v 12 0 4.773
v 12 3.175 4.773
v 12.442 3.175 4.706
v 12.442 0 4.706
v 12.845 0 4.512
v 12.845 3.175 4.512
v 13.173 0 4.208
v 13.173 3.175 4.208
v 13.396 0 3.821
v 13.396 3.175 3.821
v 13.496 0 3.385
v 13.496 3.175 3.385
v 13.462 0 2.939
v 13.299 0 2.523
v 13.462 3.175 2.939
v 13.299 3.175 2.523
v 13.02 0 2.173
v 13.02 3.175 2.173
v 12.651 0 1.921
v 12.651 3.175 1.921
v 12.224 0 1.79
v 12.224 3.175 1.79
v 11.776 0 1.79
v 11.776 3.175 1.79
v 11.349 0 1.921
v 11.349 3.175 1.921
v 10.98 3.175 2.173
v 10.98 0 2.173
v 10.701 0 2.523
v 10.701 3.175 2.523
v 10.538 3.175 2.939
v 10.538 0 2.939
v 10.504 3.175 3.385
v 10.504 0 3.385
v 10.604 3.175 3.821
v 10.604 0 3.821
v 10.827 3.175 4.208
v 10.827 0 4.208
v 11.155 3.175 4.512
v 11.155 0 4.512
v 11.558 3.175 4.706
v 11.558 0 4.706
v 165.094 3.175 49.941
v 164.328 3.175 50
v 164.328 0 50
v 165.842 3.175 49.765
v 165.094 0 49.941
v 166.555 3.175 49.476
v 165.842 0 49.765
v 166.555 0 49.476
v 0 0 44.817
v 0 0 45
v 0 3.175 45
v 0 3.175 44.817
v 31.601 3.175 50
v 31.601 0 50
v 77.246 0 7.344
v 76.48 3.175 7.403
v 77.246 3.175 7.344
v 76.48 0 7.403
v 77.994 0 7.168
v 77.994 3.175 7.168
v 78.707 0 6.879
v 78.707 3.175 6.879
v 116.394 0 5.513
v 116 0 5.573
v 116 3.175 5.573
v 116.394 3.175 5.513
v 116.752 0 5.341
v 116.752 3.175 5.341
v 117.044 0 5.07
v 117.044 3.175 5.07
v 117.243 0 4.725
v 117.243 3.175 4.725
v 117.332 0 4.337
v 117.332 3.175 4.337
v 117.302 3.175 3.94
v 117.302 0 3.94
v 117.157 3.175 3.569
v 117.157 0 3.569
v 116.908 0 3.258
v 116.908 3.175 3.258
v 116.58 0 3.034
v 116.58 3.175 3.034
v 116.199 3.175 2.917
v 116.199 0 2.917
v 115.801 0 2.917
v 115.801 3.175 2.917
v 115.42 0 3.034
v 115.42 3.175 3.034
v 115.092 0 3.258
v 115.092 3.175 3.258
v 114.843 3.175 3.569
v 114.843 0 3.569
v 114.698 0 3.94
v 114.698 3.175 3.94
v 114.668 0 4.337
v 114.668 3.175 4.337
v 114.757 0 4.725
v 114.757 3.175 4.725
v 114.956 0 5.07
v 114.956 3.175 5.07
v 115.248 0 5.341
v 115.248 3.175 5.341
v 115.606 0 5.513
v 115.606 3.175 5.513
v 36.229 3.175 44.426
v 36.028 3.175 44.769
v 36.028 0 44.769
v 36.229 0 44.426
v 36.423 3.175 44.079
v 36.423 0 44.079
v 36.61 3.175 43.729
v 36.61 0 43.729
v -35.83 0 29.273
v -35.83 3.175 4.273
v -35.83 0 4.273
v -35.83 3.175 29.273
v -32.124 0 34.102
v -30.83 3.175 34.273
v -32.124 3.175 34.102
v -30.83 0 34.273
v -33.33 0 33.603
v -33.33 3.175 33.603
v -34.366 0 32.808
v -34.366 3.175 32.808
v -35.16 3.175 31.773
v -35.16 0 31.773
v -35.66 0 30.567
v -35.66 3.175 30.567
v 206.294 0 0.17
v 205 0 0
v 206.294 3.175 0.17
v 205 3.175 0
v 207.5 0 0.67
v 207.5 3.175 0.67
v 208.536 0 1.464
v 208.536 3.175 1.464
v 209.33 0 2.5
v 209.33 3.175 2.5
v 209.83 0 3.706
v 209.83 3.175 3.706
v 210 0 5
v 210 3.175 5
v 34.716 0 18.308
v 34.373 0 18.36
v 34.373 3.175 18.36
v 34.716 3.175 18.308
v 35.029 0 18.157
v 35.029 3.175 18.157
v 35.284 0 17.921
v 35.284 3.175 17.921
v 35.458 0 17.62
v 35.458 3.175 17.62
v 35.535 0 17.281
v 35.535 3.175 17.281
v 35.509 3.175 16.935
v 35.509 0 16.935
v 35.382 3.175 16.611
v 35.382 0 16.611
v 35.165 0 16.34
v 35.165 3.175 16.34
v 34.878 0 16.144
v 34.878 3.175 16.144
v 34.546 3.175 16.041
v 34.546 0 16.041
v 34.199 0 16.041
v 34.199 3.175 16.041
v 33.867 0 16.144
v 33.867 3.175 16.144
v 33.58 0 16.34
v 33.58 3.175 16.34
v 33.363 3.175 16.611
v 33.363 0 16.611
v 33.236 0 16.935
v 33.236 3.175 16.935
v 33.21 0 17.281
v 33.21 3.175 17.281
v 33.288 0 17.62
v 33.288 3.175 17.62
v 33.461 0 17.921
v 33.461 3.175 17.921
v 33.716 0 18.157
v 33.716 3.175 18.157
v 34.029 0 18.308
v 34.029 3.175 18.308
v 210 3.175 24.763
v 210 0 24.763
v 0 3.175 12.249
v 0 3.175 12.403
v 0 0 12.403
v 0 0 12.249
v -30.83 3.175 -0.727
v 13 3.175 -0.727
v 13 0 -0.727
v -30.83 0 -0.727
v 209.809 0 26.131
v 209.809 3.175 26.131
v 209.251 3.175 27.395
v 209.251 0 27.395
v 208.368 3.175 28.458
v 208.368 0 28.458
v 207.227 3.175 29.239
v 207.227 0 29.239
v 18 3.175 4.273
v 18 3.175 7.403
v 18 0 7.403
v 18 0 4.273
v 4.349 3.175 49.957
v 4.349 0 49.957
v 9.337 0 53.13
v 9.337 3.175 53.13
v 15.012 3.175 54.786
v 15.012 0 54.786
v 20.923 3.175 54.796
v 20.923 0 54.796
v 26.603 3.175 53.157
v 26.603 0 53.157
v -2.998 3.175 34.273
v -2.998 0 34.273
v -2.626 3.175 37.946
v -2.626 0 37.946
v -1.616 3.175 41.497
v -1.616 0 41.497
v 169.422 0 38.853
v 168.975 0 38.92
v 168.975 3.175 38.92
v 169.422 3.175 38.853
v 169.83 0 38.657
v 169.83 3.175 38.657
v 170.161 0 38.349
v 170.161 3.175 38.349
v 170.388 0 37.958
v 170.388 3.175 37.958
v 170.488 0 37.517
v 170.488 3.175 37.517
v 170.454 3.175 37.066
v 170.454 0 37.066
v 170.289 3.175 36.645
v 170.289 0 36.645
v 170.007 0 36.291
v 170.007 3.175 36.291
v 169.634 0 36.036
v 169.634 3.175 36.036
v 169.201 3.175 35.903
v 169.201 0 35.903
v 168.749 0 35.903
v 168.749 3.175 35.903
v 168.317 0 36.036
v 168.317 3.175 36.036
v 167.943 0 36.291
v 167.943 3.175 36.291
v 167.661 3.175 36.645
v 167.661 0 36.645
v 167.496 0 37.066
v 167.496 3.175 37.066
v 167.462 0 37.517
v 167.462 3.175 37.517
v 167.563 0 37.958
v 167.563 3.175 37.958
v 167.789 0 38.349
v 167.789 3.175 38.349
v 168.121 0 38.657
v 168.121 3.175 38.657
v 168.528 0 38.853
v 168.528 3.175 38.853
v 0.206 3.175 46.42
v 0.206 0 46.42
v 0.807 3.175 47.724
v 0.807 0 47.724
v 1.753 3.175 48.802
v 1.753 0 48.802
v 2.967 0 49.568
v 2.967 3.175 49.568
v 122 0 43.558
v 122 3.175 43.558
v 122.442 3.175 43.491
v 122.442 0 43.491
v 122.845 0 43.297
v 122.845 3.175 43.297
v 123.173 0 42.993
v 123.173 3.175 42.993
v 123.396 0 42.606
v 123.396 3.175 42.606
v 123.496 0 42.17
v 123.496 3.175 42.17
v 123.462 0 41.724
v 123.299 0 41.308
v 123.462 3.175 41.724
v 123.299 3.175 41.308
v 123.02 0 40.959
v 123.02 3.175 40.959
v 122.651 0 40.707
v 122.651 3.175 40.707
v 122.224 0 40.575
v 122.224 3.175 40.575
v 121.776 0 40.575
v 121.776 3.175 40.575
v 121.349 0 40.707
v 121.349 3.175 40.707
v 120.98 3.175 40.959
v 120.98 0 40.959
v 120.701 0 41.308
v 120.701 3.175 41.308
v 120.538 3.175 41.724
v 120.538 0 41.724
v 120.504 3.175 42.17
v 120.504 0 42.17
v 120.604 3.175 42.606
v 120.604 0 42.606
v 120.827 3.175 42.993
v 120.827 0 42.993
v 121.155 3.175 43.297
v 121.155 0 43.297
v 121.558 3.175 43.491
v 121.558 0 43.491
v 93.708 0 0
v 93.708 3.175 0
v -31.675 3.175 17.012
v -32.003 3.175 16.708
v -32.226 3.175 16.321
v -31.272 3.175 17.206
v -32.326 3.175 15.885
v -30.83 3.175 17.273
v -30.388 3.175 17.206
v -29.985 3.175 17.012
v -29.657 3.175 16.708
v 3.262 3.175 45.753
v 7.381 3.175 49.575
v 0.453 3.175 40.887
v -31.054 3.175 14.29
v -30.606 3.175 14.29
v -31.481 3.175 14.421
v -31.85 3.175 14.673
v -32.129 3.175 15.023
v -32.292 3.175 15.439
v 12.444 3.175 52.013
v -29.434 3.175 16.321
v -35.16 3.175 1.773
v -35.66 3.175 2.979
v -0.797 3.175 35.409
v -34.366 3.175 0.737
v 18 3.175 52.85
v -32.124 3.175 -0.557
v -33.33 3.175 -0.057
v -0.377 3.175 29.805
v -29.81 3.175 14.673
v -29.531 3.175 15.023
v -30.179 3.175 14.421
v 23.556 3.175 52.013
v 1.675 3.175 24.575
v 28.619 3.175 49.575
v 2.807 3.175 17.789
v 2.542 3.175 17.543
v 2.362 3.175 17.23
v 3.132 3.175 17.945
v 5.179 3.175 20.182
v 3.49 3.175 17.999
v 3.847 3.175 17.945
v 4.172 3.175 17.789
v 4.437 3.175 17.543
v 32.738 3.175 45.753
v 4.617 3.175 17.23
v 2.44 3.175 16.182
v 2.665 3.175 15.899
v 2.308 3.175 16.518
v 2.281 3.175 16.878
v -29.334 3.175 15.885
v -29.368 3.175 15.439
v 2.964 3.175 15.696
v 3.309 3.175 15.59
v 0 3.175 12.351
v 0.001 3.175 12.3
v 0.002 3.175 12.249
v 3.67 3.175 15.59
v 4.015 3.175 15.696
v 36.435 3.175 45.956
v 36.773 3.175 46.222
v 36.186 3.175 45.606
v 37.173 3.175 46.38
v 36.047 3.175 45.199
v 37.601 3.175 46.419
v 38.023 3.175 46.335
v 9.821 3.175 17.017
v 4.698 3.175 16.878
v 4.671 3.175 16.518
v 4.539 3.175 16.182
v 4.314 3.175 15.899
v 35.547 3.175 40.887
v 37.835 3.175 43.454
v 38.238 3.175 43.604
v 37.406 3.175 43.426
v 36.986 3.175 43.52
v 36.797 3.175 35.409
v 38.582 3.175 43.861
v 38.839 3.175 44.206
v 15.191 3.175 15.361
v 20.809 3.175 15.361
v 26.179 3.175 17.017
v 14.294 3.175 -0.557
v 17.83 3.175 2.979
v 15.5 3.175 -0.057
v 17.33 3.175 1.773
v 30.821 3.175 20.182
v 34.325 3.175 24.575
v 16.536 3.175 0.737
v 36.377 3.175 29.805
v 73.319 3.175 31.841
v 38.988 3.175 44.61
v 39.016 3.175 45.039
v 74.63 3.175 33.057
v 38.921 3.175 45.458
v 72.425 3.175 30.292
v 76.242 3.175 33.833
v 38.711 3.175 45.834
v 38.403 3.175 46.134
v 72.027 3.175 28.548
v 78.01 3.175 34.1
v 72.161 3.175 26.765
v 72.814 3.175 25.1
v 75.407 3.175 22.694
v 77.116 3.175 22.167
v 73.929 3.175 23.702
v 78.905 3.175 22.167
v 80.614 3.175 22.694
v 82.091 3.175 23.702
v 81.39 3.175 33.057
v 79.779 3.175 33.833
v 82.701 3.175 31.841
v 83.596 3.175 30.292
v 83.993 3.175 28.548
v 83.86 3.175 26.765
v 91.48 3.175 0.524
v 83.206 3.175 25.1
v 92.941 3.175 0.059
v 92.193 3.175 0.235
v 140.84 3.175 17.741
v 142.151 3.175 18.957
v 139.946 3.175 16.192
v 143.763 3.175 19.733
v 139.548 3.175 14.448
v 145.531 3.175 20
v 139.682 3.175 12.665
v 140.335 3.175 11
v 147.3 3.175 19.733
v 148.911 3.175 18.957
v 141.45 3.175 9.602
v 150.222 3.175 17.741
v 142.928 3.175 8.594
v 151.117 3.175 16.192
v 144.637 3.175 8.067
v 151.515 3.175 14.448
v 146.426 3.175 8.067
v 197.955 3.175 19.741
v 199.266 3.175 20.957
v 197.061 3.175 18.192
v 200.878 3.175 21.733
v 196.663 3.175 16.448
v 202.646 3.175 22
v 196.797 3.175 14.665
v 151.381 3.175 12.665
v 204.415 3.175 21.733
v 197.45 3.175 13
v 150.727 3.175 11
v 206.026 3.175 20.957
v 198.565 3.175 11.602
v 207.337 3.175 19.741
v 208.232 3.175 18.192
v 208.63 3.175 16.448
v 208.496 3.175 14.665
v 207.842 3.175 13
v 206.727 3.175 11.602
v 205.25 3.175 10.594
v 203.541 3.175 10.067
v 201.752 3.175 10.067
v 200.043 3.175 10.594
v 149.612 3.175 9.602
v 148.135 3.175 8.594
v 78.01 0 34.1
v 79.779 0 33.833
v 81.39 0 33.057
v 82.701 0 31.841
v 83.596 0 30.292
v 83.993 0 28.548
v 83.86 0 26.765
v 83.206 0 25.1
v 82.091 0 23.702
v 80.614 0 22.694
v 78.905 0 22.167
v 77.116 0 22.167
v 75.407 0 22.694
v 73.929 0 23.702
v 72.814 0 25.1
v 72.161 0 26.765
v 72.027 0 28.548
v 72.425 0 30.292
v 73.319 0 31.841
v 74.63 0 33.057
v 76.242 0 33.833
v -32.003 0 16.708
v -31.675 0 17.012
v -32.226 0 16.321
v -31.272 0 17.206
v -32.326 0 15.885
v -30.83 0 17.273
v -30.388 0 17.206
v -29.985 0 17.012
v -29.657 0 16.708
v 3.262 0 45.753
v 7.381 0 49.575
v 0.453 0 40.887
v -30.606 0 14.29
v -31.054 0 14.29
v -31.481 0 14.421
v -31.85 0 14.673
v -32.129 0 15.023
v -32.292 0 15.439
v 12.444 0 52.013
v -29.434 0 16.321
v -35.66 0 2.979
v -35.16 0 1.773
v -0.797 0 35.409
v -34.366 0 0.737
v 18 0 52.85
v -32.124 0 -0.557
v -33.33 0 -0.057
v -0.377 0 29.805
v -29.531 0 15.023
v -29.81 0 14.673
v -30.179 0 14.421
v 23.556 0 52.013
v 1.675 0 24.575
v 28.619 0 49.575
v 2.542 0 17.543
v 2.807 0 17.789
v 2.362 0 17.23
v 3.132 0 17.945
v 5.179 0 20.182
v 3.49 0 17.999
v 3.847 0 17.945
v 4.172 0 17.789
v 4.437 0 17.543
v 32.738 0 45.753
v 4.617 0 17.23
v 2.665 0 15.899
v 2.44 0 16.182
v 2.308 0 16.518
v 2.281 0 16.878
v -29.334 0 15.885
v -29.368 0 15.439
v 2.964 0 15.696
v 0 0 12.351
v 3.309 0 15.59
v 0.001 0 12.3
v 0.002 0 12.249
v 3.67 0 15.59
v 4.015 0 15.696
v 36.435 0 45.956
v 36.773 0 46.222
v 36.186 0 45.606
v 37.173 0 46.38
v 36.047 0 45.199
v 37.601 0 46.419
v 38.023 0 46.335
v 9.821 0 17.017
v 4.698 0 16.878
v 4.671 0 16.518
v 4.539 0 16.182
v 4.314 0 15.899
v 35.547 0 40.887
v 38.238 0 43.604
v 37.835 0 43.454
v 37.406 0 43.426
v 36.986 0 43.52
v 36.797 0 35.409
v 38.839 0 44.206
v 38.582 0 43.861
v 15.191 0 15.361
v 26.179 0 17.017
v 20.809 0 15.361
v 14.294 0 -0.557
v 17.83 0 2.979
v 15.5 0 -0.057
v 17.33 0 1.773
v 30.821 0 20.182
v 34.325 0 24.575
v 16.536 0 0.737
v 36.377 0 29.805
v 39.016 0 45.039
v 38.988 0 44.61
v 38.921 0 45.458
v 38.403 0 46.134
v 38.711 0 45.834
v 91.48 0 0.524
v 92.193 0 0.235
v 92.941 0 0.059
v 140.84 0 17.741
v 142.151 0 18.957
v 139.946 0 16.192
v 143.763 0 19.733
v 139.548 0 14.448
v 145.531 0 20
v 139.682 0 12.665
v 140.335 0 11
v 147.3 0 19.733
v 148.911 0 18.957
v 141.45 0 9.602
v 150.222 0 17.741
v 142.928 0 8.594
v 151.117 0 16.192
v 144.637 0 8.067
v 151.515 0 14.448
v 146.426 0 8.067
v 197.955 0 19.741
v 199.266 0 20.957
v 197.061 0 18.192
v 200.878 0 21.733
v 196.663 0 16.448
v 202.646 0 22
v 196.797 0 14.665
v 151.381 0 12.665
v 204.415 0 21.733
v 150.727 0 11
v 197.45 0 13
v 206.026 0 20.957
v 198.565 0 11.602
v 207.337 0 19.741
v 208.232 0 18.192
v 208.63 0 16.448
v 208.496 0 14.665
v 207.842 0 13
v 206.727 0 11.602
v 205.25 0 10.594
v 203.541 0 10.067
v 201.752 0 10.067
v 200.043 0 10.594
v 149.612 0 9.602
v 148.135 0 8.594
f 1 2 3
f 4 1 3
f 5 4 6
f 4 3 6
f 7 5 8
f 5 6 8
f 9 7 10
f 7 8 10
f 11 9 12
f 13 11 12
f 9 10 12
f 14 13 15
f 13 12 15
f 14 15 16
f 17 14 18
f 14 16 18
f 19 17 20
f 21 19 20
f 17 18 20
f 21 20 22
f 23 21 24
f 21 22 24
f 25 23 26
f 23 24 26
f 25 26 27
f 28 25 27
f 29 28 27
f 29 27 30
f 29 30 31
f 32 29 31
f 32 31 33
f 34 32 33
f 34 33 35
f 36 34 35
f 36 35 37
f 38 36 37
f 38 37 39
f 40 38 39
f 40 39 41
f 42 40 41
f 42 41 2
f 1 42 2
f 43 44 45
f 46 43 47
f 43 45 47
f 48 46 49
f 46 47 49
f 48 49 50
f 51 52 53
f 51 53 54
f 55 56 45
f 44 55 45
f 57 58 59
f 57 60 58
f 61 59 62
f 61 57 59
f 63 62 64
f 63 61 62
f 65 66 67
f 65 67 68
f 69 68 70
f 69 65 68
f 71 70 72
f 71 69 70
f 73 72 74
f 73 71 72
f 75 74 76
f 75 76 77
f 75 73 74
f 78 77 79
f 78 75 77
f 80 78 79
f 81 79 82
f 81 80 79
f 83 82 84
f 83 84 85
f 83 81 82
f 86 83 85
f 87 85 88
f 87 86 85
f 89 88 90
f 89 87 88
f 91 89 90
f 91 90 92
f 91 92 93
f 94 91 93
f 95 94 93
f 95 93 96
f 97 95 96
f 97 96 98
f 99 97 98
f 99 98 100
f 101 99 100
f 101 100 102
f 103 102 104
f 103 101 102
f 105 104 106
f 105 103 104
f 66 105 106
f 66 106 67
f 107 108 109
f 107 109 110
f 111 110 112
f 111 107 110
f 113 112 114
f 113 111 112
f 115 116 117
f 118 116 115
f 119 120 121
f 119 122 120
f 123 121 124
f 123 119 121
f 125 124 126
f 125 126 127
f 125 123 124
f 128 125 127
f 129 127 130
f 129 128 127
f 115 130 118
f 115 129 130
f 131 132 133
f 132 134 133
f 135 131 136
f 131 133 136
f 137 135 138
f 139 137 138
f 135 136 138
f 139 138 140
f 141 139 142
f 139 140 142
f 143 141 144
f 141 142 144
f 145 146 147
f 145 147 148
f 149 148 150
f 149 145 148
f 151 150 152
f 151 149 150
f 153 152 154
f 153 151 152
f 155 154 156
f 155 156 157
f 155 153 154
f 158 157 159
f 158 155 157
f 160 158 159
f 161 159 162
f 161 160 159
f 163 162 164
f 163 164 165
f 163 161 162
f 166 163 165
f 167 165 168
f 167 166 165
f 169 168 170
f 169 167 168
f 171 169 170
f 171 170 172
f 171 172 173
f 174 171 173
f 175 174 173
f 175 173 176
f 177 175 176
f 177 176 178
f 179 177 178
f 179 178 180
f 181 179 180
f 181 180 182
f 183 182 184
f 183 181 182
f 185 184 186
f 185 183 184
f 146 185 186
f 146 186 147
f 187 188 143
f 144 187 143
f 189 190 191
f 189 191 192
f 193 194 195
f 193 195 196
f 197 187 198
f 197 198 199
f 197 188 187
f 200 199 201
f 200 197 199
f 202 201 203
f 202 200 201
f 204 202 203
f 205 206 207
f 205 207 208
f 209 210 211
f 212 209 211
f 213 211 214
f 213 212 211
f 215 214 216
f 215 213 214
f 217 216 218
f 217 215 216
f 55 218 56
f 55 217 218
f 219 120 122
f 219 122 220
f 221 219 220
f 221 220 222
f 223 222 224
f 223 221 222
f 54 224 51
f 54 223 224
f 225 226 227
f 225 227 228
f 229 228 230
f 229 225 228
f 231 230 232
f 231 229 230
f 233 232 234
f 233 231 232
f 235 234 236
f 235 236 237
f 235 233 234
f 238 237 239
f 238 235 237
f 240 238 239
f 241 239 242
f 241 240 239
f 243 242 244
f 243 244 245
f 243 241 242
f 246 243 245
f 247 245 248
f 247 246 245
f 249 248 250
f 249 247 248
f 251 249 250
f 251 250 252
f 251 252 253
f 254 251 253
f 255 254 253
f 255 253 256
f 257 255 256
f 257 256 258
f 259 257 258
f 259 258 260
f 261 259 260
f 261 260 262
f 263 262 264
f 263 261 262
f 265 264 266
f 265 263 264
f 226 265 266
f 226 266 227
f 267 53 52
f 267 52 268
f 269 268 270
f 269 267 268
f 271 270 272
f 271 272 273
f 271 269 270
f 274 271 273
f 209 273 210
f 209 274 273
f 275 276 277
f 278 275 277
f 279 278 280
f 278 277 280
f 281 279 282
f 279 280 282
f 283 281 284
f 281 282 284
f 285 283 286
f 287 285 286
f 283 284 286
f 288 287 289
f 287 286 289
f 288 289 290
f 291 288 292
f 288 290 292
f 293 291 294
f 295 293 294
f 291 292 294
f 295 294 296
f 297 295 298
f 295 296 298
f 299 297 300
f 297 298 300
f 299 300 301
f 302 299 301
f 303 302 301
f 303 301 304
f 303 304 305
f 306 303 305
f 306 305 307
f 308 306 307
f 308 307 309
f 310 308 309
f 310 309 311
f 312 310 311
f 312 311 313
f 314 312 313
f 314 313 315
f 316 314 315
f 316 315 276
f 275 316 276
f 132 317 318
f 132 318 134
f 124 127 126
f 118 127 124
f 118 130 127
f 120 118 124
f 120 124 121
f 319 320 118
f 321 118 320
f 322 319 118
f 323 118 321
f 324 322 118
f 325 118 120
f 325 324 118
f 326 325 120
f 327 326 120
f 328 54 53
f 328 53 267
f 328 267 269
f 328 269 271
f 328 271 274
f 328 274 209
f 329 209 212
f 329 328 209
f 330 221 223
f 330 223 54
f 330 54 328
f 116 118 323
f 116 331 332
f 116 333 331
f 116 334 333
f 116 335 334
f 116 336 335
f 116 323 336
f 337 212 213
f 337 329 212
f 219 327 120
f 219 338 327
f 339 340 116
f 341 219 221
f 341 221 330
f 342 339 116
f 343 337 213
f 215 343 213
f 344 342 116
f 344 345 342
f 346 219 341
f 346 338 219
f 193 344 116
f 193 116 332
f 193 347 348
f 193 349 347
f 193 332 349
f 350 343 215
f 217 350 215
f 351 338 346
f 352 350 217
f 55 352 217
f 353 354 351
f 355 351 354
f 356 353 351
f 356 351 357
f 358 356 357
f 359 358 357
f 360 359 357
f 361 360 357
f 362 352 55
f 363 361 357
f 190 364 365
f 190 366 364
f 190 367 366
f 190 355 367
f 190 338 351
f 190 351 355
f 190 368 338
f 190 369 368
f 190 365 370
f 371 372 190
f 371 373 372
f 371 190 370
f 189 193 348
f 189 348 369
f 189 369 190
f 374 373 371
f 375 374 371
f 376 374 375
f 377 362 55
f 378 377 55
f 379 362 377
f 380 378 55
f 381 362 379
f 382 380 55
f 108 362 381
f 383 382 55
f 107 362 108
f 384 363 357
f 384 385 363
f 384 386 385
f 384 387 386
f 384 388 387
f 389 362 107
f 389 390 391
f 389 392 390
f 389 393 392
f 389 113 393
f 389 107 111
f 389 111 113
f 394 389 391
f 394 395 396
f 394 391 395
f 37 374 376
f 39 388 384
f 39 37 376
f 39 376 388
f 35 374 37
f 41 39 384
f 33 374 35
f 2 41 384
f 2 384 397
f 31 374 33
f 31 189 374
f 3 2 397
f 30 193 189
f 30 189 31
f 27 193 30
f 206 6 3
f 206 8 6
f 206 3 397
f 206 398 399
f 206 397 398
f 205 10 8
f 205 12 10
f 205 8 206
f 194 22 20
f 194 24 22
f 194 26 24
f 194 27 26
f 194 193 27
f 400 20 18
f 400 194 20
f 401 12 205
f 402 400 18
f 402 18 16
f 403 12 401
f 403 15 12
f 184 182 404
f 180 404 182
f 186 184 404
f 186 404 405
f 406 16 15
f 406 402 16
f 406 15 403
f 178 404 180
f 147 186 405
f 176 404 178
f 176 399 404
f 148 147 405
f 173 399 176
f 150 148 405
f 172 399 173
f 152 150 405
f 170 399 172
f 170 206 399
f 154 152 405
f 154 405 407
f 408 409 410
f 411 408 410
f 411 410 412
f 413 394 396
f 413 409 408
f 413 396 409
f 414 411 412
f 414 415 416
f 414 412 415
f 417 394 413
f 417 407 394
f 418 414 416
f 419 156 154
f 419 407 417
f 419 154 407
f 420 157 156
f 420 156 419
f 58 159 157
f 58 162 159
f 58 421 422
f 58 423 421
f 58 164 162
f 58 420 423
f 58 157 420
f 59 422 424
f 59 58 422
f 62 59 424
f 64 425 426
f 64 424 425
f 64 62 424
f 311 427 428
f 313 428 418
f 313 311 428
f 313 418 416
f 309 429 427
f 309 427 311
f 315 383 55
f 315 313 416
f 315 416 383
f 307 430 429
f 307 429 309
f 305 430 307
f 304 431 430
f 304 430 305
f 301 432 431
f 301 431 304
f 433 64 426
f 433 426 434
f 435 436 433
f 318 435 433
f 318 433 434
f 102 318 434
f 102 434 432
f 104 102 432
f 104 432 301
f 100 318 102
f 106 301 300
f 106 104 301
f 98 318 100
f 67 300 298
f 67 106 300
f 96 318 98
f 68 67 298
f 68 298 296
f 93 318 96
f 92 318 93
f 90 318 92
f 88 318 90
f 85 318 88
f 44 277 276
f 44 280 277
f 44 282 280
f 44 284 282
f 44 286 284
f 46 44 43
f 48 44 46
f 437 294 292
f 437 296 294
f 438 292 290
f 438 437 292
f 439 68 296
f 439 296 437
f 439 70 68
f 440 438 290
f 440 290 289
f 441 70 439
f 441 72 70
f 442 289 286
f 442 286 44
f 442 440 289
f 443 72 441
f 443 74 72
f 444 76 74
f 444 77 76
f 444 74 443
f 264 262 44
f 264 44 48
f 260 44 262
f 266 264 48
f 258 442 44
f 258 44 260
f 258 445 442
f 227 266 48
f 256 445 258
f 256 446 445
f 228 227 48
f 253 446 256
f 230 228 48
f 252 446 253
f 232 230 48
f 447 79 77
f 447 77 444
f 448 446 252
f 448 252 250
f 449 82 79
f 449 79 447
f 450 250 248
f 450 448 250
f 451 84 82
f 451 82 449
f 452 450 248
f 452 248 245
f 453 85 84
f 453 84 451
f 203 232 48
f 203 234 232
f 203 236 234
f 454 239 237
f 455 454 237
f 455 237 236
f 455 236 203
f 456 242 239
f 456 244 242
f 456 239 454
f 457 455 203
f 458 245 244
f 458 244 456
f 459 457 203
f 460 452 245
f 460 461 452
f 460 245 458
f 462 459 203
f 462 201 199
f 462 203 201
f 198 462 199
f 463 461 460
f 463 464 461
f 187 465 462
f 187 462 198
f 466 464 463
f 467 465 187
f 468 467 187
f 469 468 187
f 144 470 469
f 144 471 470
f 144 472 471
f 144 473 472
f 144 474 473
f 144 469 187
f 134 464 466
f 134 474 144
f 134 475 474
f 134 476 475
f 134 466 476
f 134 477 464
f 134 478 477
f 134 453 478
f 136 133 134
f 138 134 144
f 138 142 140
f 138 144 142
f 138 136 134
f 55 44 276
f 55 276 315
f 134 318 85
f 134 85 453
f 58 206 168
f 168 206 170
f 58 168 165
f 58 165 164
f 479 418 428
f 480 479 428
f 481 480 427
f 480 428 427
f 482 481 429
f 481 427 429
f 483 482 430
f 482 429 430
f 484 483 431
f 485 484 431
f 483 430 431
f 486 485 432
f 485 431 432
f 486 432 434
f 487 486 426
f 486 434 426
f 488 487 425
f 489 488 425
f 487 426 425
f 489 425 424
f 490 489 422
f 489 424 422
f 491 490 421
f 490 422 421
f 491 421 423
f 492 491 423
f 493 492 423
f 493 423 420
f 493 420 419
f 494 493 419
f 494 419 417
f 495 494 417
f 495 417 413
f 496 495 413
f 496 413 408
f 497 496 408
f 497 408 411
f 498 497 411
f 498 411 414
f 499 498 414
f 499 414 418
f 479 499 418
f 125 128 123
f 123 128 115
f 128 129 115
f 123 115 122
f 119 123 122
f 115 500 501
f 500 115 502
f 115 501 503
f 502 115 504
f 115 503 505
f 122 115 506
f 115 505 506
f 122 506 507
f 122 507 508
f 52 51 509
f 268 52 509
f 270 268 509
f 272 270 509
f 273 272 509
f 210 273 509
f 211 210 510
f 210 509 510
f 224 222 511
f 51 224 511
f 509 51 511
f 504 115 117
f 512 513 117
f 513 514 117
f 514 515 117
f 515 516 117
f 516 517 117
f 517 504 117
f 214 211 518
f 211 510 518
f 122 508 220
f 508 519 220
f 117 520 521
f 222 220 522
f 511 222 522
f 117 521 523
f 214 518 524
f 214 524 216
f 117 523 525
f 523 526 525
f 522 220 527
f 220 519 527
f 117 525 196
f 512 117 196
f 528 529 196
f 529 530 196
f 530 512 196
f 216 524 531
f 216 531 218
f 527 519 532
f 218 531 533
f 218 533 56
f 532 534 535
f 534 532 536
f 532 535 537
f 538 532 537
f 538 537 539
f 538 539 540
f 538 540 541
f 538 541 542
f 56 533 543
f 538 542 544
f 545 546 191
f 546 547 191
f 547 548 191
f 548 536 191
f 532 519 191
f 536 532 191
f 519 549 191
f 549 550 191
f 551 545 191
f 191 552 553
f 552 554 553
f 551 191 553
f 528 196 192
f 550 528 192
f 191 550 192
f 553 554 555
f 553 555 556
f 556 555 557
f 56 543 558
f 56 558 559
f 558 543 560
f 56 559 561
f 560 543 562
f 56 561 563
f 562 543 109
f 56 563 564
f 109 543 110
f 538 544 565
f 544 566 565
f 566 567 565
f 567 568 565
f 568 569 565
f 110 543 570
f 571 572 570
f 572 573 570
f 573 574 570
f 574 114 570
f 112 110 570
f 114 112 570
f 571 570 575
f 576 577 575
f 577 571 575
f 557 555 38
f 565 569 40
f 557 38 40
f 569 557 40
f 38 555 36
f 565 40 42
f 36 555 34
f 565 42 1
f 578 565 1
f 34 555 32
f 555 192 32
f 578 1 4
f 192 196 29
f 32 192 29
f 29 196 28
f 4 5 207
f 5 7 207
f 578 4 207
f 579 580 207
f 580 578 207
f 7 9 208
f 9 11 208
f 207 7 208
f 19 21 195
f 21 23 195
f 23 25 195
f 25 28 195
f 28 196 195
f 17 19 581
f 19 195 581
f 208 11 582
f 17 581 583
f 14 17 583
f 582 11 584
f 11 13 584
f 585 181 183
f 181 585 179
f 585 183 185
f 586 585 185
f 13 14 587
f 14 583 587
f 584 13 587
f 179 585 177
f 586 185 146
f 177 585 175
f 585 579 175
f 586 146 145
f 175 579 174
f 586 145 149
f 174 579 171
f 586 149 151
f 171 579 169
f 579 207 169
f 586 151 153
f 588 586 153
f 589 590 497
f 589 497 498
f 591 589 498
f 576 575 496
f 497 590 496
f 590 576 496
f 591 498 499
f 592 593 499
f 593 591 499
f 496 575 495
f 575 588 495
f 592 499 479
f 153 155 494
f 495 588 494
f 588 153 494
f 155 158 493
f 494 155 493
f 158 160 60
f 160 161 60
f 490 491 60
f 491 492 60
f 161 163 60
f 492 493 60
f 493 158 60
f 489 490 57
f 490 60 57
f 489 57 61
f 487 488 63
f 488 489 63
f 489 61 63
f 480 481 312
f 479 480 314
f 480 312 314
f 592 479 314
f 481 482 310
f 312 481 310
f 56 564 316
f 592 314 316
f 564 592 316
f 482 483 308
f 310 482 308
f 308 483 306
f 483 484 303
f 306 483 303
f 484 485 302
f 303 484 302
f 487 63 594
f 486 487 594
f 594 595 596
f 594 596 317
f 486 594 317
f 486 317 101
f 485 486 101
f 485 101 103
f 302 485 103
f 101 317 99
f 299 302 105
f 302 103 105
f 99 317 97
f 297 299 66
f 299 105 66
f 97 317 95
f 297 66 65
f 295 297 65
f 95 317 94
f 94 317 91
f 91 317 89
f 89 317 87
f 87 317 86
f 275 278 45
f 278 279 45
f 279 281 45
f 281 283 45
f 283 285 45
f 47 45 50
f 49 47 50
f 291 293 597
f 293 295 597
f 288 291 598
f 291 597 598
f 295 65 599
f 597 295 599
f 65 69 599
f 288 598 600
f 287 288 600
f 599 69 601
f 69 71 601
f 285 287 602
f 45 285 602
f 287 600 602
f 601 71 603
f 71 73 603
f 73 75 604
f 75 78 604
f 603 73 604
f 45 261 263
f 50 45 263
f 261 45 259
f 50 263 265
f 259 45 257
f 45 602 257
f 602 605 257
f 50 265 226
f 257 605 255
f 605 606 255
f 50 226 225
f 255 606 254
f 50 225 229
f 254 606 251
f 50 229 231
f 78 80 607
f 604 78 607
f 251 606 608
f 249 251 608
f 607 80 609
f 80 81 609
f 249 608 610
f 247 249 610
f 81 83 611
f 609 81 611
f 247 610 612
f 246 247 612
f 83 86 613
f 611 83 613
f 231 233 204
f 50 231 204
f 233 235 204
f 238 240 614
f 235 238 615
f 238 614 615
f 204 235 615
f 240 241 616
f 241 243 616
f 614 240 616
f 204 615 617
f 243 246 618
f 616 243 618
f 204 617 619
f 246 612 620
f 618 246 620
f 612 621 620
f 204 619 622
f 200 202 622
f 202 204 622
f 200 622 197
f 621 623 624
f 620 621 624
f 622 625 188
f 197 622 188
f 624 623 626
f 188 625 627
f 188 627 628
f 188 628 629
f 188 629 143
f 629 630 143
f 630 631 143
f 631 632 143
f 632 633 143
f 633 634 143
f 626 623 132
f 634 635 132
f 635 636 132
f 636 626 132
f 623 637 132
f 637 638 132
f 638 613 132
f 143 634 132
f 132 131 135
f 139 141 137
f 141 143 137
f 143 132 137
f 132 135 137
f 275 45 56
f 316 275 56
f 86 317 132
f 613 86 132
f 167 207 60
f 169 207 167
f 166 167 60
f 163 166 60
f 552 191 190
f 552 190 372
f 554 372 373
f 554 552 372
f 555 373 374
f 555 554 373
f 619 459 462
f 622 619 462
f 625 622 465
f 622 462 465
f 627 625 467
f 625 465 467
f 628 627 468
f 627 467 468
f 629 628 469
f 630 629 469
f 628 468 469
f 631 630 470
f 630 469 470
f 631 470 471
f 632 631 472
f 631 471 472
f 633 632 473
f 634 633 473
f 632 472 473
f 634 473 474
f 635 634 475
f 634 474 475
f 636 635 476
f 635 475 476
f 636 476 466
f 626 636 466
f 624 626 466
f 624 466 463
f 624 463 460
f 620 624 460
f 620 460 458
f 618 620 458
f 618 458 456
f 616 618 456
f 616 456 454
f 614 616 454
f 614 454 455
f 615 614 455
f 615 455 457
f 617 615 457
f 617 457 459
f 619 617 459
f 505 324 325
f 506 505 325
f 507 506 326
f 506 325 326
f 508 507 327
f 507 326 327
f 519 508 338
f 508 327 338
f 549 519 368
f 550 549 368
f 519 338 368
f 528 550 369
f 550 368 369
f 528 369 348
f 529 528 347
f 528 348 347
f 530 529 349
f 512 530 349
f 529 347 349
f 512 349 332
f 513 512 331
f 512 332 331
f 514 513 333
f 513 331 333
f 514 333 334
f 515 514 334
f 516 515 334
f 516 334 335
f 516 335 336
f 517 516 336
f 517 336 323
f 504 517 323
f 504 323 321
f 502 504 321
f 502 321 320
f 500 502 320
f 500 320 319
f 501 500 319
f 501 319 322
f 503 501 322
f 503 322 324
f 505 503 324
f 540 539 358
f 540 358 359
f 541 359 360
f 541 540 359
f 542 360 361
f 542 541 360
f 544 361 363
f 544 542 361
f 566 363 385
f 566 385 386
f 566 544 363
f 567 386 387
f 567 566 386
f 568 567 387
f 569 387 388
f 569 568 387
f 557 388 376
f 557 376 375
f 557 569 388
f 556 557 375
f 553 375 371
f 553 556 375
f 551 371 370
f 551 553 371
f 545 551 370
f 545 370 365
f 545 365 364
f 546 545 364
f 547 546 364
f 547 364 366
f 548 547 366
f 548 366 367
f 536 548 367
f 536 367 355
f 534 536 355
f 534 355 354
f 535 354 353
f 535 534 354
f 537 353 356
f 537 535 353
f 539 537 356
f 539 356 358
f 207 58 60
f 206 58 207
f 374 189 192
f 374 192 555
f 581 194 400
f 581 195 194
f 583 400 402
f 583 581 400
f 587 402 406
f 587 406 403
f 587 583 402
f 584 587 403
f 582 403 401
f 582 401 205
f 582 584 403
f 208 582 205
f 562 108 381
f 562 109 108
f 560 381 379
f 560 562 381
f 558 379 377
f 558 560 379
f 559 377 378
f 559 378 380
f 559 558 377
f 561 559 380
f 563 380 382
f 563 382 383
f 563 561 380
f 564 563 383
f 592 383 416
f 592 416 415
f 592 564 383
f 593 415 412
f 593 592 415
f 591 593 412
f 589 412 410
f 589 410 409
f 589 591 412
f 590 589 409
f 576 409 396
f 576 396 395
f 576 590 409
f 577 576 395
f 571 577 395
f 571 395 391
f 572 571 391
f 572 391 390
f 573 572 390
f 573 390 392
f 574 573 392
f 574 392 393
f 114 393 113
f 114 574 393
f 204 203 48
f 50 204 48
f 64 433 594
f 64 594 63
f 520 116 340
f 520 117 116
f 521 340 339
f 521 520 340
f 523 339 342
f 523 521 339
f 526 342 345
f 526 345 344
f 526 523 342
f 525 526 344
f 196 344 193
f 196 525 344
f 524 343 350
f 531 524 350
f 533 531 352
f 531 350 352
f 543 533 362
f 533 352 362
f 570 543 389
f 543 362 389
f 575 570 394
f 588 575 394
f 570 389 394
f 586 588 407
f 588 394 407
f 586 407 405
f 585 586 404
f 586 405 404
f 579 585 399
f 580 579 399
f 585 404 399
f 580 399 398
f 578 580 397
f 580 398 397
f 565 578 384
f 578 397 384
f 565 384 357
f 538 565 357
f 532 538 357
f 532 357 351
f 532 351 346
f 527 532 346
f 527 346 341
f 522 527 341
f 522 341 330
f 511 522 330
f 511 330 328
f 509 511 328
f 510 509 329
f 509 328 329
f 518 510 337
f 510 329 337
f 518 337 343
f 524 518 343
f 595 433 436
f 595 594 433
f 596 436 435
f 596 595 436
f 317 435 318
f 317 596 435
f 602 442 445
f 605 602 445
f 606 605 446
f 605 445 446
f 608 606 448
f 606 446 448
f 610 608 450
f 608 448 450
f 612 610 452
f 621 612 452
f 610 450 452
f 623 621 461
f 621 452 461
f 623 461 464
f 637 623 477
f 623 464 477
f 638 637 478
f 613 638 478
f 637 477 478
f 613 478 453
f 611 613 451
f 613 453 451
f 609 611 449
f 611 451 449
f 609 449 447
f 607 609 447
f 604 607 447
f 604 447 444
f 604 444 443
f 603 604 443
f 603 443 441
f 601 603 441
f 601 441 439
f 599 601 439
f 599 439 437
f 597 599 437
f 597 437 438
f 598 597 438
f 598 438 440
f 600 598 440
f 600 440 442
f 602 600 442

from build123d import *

# Parameters (mm, degrees)
SKETCH1_W           = 210
SKETCH1_H           = 50
SKETCH1_R           = 1.211665018
SKETCH1_R_2         = 1.165617118
SKETCH1_R_3         = 1.5
SKETCH1_R_4         = 1.517273905
SKETCH1_R_5         = 1.335614121
SKETCH1_R_6         = 1.62438417
BOSS_EXTRUDE1_DEPTH = 3.175
SKETCH2_R           = 2
CUT_EXTRUDE1_DEPTH  = 10
SKETCH3_R           = 6
SKETCH3_R_2         = 0.586995366
CUT_EXTRUDE2_DEPTH  = 57.15
CUT_EXTRUDE7_DEPTH  = 10
FILLET3_R           = 5
SKETCH11_R          = 18.5
SKETCH11_R_2        = 2
BOSS_EXTRUDE4_DEPTH = 3.175
SKETCH12_R          = 21
BOSS_EXTRUDE5_DEPTH = 3.175
SKETCH13_R          = 18.85
CUT_EXTRUDE8_DEPTH  = 3.175
BOSS_EXTRUDE6_DEPTH = 3.175
FILLET4_R           = 5
SKETCH15_R          = 1.5
CUT_EXTRUDE9_DEPTH  = 10
SKETCH16_R          = 1.5
CUT_EXTRUDE10_DEPTH = 10
SKETCH17_R          = 1.5
CUT_EXTRUDE11_DEPTH = 10


with BuildPart() as part:
    # Sketch1 → Boss-Extrude1 (new body)
    with BuildSketch(Plane(origin=(0, 0, 0), x_dir=(1, 0, 0), z_dir=(0, 1, 0))):
        with Locations((105, -25)):
            Rectangle(SKETCH1_W, SKETCH1_H)
        with Locations(Location((3.489526233, -16.787661112, 0), (0, 0, 270))):
            Circle(SKETCH1_R, mode=Mode.SUBTRACT)
        with Locations(Location((34.37258772, -17.194005245, 0), (0, 0, 270))):
            Circle(SKETCH1_R_2, mode=Mode.SUBTRACT)
        with Locations(Location((37.520749958, -44.921198121, 0), (0, 0, 270))):
            Circle(SKETCH1_R_3, mode=Mode.SUBTRACT)
        with Locations(Location((168.975233936, -37.403209633, 0), (0, 0, 270))):
            Circle(SKETCH1_R_4, mode=Mode.SUBTRACT)
        with Locations(Location((116, -4.237214774, 0), (0, 0, 270))):
            Circle(SKETCH1_R_5, mode=Mode.SUBTRACT)
        with Locations(Location((12.257640281, -3.274812063, 0), (0, 0, 270))):
            Circle(SKETCH1_R_6, mode=Mode.SUBTRACT)
    extrude(amount=BOSS_EXTRUDE1_DEPTH)

    # Sketch2 → Cut-Extrude1 (cut)
    with BuildSketch(Plane(origin=(0, 3.175, 0), x_dir=(1, 0, 0), z_dir=(0, 1, 0))):
        with Locations(Location((10, -26, 0), (0, 0, 270))):
            Circle(SKETCH2_R)
        with Locations(Location((10, -42, 0), (0, 0, 270))):
            Circle(SKETCH2_R)
        with Locations(Location((26, -26, 0), (0, 0, 270))):
            Circle(SKETCH2_R)
        with Locations(Location((26, -42, 0), (0, 0, 270))):
            Circle(SKETCH2_R)
    extrude(amount=-CUT_EXTRUDE1_DEPTH, mode=Mode.SUBTRACT)

    # Sketch3 → Cut-Extrude2 (cut)
    with BuildSketch(Plane(origin=(0, 3.175, 0), x_dir=(1, 0, 0), z_dir=(0, 1, 0))):
        with Locations(Location((78.01026379, -28.1, 0), (0, 0, 270))):
            Circle(SKETCH3_R)
        with Locations(Location((145.531297368, -14, 0), (0, 0, 270))):
            Circle(SKETCH3_R)
        with Locations(Location((18, -34, 0), (0, 0, 270))):
            Circle(SKETCH3_R_2)
        with Locations(Location((202.646291021, -16, 0), (0, 0, 270))):
            Circle(SKETCH3_R)
    extrude(amount=-CUT_EXTRUDE2_DEPTH, mode=Mode.SUBTRACT)

    # Sketch10 → Cut-Extrude7 (cut)
    with BuildSketch(Plane(origin=(0, 3.175, 0), x_dir=(1, 0, 0), z_dir=(0, 1, 0))):
        Polygon((210, -27.859435908), (165.502877994, -50), (210, -50), align=None)
        Polygon((92.532613397, 0), (77.65477062, -7.402812063), (0, -7.402812063), (0, 0), align=None)
    extrude(amount=-CUT_EXTRUDE7_DEPTH, mode=Mode.SUBTRACT)

    # Fillet3
    fillet3_edges = [part.edges().sort_by_distance(p)[0] for p in [
        (210, 1.5875, 0),
        (0, 1.5875, 50),
        (92.532613397, 1.5875, 0),
        (210, 1.5875, 27.859435908),
        (165.502877994, 1.5875, 50),
        (77.65477062, 1.5875, 7.402812063),
        (0, 1.5875, 7.402812063),
    ]]
    fillet(fillet3_edges, radius=FILLET3_R)

    # Sketch11 → Boss-Extrude4 (add)
    with BuildSketch(Plane(origin=(0, 3.175, 0), x_dir=(1, 0, 0), z_dir=(0, 1, 0))):
        with Locations((18, -34)):
            Circle(SKETCH11_R)
        with Locations(Location((10, -26, 0), (0, 0, 270))):
            Circle(SKETCH11_R_2, mode=Mode.SUBTRACT)
        with Locations(Location((10, -42, 0), (0, 0, 270))):
            Circle(SKETCH11_R_2, mode=Mode.SUBTRACT)
        with Locations(Location((26, -26, 0), (0, 0, 270))):
            Circle(SKETCH11_R_2, mode=Mode.SUBTRACT)
        with Locations(Location((26, -42, 0), (0, 0, 270))):
            Circle(SKETCH11_R_2, mode=Mode.SUBTRACT)
    extrude(amount=-BOSS_EXTRUDE4_DEPTH)

    # Sketch12 → Boss-Extrude5 (add)
    with BuildSketch(Plane(origin=(0, 3.175, 0), x_dir=(1, 0, 0), z_dir=(0, 1, 0))):
        with Locations((18, -34)):
            Circle(SKETCH12_R)
    extrude(amount=-BOSS_EXTRUDE5_DEPTH)

    # Sketch13 → Cut-Extrude8 (cut)
    with BuildSketch(Plane(origin=(0, 3.175, 0), x_dir=(1, 0, 0), z_dir=(0, 1, 0))):
        with Locations(Location((18, -34, 0), (0, 0, 270))):
            Circle(SKETCH13_R)
    extrude(amount=-CUT_EXTRUDE8_DEPTH, mode=Mode.SUBTRACT)

    # Sketch14 → Boss-Extrude6 (add)
    with BuildSketch(Plane(origin=(0, 3.175, 0), x_dir=(1, 0, 0), z_dir=(0, 1, 0))):
        with BuildLine():
            Line((-35.83, -34.272812063), (-2.998227868, -34.272812063))
            ThreePointArc((-2.998227868, -34.272812063), (-2.272136238, -28.519079241), (0, -23.183346174))
            Line((0, -23.183346174), (0, -12.402812063))
            Line((0, -12.402812063), (0, -12.248529085))
            Line((0, -12.248529085), (0, 0.727187937))
            Line((0, 0.727187937), (-35.83, 0.727187937))
            Line((-35.83, 0.727187937), (-35.83, -34.272812063))
        make_face()
        with BuildLine():
            Line((0, 0.727187937), (0, -12.248529085))
            Line((0, -12.248529085), (0.002380891, -12.248529085))
            ThreePointArc((0.002380891, -12.248529085), (1.51944077, -8.813145304), (5, -7.402812063))
            Line((5, -7.402812063), (18, -7.402812063))
            Line((18, -7.402812063), (18, 0.727187937))
            Line((18, 0.727187937), (0, 0.727187937))
        make_face()
    extrude(amount=-BOSS_EXTRUDE6_DEPTH)

    # Fillet4
    fillet4_edges = [part.edges().sort_by_distance(p)[0] for p in [
        (-35.83, 1.5875, 34.272812063),
        (-35.83, 1.5875, -0.727187937),
        (18, 1.5875, -0.727187937),
    ]]
    fillet(fillet4_edges, radius=FILLET4_R)

    # Sketch15 → Cut-Extrude9 (cut)
    with BuildSketch(Plane(origin=(0, 3.175, 0), x_dir=(1, 0, 0), z_dir=(0, 1, 0))):
        with Locations(Location((122, -42.058139805, 0), (0, 0, 270))):
            Circle(SKETCH15_R)
    extrude(amount=-CUT_EXTRUDE9_DEPTH, mode=Mode.SUBTRACT)

    # Sketch16 → Cut-Extrude10 (cut)
    with BuildSketch(Plane(origin=(0, 3.175, 0), x_dir=(1, 0, 0), z_dir=(0, 1, 0))):
        with Locations(Location((12, -3.272812063, 0), (0, 0, 270))):
            Circle(SKETCH16_R)
    extrude(amount=-CUT_EXTRUDE10_DEPTH, mode=Mode.SUBTRACT)

    # Sketch17 → Cut-Extrude11 (cut)
    with BuildSketch(Plane(origin=(0, 3.175, 0), x_dir=(1, 0, 0), z_dir=(0, 1, 0))):
        with Locations(Location((-30.83, -15.772812063, 0), (0, 0, 270))):
            Circle(SKETCH17_R)
    extrude(amount=-CUT_EXTRUDE11_DEPTH, mode=Mode.SUBTRACT)


solid = part.part
